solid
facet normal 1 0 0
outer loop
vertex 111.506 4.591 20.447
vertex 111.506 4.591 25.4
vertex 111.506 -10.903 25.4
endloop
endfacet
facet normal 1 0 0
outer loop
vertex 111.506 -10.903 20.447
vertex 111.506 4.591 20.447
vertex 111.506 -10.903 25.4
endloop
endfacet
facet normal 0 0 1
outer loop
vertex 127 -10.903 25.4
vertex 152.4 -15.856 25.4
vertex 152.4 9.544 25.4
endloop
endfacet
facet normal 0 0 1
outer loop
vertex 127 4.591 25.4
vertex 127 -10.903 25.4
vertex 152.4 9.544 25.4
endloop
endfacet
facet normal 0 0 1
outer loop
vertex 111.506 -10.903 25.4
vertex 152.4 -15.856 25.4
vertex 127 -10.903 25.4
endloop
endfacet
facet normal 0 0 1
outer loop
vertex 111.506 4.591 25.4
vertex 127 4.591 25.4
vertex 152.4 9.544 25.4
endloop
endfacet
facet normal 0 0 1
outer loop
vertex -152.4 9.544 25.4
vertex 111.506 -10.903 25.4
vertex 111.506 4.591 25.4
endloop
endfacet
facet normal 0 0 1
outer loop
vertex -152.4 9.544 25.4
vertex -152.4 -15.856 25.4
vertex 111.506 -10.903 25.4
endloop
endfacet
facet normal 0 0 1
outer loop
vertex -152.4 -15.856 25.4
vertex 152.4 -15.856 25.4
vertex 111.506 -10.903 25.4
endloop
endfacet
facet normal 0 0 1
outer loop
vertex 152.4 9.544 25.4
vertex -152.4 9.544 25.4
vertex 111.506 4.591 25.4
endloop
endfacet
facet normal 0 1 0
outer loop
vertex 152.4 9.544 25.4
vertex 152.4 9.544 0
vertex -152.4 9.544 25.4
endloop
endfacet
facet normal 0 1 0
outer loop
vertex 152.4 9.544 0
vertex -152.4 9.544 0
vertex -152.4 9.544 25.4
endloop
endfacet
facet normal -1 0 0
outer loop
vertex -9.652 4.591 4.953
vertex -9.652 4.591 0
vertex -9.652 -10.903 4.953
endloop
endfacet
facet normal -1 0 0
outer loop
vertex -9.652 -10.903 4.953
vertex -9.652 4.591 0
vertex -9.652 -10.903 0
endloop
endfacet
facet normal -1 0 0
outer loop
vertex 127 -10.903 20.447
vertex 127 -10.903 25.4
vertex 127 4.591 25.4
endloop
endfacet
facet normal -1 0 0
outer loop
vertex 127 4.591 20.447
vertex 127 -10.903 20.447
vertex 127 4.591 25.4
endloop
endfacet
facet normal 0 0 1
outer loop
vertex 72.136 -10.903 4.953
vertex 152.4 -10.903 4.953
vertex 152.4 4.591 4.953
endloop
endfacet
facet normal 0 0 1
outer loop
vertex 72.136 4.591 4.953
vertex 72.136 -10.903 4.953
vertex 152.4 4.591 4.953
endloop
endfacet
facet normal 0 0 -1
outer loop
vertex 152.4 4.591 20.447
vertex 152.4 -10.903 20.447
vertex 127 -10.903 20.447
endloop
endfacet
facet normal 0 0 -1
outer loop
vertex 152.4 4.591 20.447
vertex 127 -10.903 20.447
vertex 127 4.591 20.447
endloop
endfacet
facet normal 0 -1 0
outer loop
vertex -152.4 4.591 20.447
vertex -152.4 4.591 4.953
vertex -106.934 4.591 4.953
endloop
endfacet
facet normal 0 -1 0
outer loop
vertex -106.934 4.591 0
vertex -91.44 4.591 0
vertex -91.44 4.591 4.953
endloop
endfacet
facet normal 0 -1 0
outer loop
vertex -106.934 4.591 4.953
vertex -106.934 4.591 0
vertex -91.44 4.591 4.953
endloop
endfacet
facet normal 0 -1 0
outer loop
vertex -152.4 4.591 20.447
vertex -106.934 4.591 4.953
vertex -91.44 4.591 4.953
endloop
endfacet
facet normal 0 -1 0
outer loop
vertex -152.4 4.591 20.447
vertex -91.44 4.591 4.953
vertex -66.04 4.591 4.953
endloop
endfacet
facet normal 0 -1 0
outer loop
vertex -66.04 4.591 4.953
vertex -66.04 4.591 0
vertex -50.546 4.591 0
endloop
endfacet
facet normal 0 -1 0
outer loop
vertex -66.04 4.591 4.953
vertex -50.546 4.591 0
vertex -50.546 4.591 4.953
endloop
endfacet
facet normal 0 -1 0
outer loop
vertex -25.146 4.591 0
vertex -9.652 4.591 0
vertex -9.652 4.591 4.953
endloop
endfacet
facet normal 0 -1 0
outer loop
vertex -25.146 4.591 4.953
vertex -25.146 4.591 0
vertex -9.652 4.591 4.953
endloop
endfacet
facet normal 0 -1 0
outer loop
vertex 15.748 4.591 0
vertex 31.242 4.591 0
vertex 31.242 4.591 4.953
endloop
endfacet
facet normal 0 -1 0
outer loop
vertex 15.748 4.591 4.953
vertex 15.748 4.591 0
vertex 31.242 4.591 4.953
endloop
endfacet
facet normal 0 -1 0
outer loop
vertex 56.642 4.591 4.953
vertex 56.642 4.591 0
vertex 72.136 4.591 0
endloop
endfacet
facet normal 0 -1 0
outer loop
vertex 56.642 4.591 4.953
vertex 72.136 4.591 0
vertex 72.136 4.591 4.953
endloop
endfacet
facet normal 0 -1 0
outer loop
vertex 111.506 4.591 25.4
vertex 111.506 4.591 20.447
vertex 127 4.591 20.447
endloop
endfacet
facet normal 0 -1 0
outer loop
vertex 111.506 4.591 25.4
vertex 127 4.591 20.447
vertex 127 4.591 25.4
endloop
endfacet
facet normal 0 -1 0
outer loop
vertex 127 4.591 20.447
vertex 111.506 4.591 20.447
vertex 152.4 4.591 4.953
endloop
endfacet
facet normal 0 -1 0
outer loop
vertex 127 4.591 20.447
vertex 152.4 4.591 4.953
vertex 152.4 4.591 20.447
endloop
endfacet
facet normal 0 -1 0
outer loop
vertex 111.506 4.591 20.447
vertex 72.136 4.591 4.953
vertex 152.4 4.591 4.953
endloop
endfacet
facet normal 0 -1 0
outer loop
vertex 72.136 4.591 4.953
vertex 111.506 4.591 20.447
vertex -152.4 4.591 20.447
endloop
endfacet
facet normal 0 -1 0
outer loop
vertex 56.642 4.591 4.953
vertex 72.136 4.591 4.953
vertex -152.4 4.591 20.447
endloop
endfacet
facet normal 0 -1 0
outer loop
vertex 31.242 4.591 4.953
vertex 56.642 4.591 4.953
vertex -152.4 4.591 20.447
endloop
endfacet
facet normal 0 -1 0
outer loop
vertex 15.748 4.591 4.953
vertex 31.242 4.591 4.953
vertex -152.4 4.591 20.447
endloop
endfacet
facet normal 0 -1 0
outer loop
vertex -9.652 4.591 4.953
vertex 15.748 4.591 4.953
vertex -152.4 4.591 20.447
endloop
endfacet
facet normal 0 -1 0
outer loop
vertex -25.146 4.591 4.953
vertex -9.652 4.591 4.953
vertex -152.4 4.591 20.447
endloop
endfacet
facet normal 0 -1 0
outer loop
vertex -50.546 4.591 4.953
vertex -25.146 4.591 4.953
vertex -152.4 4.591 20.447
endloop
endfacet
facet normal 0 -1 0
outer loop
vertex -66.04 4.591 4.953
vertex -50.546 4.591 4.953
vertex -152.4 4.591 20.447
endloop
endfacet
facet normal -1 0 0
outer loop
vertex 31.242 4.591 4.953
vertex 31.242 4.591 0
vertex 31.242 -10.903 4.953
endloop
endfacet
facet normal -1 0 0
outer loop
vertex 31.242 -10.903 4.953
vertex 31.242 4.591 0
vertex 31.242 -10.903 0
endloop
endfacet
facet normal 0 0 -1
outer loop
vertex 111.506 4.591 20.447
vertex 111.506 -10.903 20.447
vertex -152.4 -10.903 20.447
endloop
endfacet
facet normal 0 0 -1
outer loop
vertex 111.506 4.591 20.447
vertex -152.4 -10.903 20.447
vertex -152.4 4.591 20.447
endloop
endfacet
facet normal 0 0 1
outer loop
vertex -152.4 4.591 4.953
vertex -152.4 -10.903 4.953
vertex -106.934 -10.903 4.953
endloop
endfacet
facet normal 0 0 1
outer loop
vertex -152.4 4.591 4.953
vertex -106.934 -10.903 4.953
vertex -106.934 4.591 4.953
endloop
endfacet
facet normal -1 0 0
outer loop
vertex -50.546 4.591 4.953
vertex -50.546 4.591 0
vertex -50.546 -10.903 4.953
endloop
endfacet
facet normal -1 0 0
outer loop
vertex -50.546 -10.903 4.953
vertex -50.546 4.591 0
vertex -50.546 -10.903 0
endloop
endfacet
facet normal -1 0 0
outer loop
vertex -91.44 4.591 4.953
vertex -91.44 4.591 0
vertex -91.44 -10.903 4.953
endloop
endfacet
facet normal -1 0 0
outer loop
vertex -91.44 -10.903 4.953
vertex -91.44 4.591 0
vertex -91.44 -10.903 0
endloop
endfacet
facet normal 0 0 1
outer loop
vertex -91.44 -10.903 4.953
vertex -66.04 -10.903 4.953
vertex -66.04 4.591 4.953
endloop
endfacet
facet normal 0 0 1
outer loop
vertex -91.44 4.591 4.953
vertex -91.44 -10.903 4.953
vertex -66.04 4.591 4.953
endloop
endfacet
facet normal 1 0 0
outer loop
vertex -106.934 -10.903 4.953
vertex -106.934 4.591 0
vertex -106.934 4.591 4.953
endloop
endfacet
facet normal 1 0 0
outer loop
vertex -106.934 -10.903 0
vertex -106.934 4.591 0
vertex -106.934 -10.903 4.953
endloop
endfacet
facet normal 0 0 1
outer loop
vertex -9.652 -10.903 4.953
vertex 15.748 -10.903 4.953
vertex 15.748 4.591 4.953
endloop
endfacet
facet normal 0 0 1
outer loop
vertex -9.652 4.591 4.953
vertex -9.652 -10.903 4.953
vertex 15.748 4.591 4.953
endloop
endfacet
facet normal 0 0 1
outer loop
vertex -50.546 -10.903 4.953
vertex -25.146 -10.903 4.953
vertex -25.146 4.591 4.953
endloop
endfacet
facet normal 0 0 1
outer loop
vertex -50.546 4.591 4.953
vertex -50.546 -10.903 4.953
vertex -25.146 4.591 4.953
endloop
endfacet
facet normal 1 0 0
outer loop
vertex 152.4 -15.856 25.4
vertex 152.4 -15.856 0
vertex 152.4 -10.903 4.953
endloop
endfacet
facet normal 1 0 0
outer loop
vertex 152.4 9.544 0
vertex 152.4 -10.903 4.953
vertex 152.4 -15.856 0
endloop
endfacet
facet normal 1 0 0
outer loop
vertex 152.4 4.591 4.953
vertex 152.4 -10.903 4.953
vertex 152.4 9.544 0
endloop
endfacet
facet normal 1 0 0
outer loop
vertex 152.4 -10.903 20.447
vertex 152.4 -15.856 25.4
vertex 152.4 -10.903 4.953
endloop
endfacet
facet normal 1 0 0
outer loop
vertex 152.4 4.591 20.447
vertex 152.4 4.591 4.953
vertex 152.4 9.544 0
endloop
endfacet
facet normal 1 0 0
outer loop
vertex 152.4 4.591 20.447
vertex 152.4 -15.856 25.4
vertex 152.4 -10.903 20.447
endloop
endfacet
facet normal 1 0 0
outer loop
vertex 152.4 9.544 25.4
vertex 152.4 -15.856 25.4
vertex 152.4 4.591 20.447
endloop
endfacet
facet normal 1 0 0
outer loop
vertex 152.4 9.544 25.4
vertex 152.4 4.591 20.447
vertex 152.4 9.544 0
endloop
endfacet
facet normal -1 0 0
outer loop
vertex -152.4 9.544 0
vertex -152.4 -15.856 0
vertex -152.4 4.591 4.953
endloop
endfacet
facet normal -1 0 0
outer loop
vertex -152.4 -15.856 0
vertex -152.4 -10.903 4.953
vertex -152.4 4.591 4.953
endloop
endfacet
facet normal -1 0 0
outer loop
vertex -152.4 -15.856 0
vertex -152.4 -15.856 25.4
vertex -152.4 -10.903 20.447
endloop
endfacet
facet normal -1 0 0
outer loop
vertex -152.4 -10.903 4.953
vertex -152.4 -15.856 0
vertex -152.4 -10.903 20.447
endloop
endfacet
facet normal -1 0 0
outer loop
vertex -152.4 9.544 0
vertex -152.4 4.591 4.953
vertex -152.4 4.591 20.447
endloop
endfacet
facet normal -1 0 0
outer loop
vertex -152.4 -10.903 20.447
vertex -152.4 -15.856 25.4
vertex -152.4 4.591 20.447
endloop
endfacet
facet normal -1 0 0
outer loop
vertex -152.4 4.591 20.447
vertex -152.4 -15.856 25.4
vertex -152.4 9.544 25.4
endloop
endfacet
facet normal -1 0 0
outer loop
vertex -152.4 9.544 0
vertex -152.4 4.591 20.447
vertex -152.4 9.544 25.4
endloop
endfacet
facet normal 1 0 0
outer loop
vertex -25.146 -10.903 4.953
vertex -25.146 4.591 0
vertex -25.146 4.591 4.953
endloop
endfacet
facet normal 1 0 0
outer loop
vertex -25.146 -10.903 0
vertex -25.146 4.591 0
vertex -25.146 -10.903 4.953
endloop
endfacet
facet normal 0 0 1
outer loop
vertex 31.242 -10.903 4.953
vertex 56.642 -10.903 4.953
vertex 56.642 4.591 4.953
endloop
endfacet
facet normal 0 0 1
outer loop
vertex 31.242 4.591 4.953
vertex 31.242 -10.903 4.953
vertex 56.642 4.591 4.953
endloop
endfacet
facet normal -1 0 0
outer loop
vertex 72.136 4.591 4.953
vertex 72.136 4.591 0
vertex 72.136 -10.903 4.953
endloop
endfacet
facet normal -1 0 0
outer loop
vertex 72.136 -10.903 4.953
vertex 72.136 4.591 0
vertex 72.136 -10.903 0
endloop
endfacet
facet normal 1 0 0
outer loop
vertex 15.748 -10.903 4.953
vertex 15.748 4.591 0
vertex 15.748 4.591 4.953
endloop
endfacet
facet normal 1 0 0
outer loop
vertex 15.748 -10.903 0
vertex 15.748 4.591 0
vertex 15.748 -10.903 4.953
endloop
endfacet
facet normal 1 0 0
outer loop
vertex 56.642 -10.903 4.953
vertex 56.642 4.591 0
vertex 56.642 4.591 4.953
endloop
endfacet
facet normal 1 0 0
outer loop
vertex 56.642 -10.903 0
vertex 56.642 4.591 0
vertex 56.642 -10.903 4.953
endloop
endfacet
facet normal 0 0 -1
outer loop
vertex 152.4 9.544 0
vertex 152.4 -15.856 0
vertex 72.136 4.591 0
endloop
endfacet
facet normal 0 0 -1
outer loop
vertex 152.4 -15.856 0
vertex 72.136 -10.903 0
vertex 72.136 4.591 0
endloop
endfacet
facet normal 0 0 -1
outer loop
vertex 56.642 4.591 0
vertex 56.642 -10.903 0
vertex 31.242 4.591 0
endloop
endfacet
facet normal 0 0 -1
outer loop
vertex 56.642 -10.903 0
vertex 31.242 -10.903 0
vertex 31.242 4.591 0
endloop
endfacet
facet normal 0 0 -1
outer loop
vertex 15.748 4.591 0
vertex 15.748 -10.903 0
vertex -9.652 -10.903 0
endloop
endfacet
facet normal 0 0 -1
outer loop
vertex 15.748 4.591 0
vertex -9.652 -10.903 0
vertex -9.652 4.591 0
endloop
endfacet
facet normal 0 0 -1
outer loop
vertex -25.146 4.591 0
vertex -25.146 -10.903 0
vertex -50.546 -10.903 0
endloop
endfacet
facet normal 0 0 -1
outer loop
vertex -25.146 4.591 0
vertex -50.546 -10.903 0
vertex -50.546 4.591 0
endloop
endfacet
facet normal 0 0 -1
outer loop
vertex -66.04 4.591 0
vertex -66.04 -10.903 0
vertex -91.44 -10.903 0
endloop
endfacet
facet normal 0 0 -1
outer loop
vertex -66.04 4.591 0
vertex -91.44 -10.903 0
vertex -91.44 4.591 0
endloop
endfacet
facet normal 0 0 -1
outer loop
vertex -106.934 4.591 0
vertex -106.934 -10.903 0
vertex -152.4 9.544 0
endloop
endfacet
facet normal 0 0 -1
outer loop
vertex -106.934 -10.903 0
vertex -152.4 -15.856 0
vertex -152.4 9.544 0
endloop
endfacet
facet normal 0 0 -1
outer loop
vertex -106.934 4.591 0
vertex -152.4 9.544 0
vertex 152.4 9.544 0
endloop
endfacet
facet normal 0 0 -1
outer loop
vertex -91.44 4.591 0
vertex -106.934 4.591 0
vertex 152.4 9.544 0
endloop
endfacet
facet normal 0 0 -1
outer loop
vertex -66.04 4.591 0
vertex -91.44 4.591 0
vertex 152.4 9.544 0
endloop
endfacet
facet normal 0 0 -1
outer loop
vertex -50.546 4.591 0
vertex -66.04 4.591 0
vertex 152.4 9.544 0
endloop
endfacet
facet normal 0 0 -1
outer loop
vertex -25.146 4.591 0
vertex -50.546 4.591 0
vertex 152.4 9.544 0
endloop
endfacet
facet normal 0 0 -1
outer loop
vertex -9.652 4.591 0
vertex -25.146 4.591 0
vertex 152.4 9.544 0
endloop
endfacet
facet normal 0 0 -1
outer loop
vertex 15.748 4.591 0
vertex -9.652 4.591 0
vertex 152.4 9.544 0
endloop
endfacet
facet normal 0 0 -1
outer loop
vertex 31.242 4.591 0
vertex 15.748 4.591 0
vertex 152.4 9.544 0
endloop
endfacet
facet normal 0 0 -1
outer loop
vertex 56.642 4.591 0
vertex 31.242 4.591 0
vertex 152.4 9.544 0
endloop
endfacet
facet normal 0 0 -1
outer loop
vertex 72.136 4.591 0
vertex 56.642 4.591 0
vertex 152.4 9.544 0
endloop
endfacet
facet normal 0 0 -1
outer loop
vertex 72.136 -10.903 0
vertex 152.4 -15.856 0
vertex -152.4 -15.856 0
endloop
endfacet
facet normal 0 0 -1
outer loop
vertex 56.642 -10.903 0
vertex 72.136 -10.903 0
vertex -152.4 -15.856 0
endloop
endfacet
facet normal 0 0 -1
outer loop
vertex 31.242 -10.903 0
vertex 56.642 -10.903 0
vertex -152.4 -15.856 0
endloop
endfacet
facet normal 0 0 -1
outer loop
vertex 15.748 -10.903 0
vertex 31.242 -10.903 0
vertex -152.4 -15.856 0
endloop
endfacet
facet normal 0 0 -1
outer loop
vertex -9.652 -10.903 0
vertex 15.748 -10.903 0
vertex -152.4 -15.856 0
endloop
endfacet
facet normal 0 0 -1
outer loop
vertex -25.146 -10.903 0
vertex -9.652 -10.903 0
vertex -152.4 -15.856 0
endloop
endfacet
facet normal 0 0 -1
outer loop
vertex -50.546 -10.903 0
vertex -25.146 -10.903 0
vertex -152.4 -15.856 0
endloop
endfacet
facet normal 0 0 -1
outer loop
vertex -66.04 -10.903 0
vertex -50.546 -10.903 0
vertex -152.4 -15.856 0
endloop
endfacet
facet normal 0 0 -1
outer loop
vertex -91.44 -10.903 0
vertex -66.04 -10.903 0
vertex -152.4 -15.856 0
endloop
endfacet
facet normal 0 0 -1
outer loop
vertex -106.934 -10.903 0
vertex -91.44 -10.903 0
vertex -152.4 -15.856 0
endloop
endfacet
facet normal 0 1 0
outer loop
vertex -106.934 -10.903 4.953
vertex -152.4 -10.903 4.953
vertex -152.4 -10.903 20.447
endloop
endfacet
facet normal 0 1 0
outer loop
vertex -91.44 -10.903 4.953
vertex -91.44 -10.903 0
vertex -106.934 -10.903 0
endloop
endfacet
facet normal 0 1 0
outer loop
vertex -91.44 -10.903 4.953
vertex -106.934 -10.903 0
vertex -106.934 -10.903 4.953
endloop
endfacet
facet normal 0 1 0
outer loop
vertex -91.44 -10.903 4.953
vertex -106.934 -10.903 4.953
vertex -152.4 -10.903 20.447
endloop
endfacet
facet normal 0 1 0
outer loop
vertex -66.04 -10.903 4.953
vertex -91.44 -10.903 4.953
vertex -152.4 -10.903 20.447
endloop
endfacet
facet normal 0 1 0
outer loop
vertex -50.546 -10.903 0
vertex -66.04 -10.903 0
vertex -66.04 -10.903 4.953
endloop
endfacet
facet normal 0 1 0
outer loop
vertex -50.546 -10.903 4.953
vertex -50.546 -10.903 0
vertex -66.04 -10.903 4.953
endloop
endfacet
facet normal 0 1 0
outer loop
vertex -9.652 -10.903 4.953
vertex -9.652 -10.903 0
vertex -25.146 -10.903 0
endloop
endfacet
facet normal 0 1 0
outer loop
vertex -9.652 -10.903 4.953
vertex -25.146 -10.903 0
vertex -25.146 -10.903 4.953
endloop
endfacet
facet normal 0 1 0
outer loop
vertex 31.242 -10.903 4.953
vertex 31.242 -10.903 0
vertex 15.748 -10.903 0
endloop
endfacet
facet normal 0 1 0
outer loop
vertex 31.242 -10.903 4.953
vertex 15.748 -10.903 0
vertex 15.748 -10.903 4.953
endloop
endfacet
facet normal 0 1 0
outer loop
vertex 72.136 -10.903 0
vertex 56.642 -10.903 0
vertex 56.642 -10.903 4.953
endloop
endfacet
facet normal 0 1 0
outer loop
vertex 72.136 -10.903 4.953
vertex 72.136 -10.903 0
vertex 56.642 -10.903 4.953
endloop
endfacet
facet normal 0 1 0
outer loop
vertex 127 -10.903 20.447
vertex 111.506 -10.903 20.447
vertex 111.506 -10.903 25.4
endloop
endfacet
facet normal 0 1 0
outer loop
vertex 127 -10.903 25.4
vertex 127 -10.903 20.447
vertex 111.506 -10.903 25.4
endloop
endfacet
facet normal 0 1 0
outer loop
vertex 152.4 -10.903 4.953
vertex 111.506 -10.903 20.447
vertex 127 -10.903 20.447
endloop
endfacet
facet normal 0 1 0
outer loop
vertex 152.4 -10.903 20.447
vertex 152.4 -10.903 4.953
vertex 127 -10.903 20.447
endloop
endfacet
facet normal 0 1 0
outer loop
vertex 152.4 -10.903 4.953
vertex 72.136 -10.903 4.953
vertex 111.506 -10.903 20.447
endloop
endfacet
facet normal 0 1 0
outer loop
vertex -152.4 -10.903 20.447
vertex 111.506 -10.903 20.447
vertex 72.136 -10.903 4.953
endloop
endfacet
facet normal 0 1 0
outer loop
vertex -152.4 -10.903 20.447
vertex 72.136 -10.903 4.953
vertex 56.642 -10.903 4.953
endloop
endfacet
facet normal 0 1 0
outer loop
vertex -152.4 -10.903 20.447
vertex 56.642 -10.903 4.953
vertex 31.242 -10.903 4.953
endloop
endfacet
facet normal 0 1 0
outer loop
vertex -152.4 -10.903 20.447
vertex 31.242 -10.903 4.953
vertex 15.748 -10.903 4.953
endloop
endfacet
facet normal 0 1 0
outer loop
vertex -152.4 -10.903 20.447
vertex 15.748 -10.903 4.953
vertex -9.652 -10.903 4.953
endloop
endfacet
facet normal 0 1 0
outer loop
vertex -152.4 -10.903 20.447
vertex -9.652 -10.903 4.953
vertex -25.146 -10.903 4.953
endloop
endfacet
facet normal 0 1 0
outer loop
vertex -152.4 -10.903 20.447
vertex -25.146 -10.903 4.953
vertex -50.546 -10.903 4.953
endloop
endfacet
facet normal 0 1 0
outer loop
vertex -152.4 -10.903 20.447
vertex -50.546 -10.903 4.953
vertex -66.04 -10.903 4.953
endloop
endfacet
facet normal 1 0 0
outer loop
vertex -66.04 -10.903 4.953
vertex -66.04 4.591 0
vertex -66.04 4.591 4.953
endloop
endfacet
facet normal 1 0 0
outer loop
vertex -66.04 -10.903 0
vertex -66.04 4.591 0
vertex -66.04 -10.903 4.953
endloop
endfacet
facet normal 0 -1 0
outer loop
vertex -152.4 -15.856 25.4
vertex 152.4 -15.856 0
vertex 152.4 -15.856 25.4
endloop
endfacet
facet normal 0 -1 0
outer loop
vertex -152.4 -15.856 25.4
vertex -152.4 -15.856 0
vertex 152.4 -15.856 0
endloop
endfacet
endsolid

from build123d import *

# Parameters (mm, degrees)
F0_W      = 25.4
F0_H      = 25.4
F1_DEPTH  = 152.4
F1_FACE_W = 25.4
F1_FACE_H = 25.4
F2_DEPTH  = 152.4
F3_W      = 15.494
F3_H      = 15.494
F4_DEPTH  = 304.801
F5_W      = 15.494
F5_H      = 15.494
F6_DEPTH  = 19.05
F7_W      = 15.494
F7_H      = 15.494
F8_DEPTH  = 17.78
F9_DEPTH  = 15.24
F10_DEPTH = 15.24
F11_DEPTH = 15.24
F13_DEPTH = 15.24


with BuildPart() as f1:
    # F0 (on Right) → F1 (new body)
    with BuildSketch(Plane.YZ):
        with Locations((-3.156137, 12.7)):
            Rectangle(F0_W, F0_H)
    extrude(amount=-F1_DEPTH)

    # F1_face (on face) → F2 (join)
    with BuildSketch(Plane(origin=(0, -3.156137, 12.7), x_dir=(0, 1, 0), z_dir=(1, 0, 0))):
        Rectangle(F1_FACE_W, F1_FACE_H)
    extrude(amount=F2_DEPTH)

    # F3 (on face) → F4 (cut, through all)
    with BuildSketch(Plane.YZ.offset(152.4)):
        with Locations((-3.156137, 12.7)):
            Rectangle(F3_W, F3_H)
    extrude(amount=-F4_DEPTH, mode=Mode.SUBTRACT)

    # F5 (on face) → F6 (cut)
    with BuildSketch(Plane(origin=(0, 0, 0), x_dir=(1, 0, 0), z_dir=(0, 0, -1))):
        with Locations((-99.187, 3.156137)):
            Rectangle(F5_W, F5_H)
    extrude(amount=-F6_DEPTH, mode=Mode.SUBTRACT)

    # F7 (on face) → F8 (cut)
    with BuildSketch(Plane(origin=(0, 0, 0), x_dir=(1, 0, 0), z_dir=(0, 0, -1))):
        with Locations((-58.293, 3.156137)):
            Rectangle(F7_W, F7_H)
    extrude(amount=-F8_DEPTH, mode=Mode.SUBTRACT)

    # F7 (on face) → F9 (cut)
    with BuildSketch(Plane(origin=(0, 0, 0), x_dir=(1, 0, 0), z_dir=(0, 0, -1))):
        with Locations((-17.399, 3.156137)):
            Rectangle(F7_W, F7_H)
    extrude(amount=-F9_DEPTH, mode=Mode.SUBTRACT)

    # F7 (on face) → F10 (cut)
    with BuildSketch(Plane(origin=(0, 0, 0), x_dir=(1, 0, 0), z_dir=(0, 0, -1))):
        with Locations((23.495, 3.156137)):
            Rectangle(F7_W, F7_H)
    extrude(amount=-F10_DEPTH, mode=Mode.SUBTRACT)

    # F7 (on face) → F11 (cut)
    with BuildSketch(Plane(origin=(0, 0, 0), x_dir=(1, 0, 0), z_dir=(0, 0, -1))):
        with Locations((64.389, 3.156137)):
            Rectangle(F7_W, F7_H)
    extrude(amount=-F11_DEPTH, mode=Mode.SUBTRACT)

    # F12 (on face) → F13 (cut)
    with BuildSketch(Plane.XY.offset(25.4)):
        Polygon((127, -10.903137), (127, -3.156137), (127, 4.590863), (111.506, 4.590863), (111.506, -10.903137), align=None)
    extrude(amount=-F13_DEPTH, mode=Mode.SUBTRACT)


solid = f1.part
